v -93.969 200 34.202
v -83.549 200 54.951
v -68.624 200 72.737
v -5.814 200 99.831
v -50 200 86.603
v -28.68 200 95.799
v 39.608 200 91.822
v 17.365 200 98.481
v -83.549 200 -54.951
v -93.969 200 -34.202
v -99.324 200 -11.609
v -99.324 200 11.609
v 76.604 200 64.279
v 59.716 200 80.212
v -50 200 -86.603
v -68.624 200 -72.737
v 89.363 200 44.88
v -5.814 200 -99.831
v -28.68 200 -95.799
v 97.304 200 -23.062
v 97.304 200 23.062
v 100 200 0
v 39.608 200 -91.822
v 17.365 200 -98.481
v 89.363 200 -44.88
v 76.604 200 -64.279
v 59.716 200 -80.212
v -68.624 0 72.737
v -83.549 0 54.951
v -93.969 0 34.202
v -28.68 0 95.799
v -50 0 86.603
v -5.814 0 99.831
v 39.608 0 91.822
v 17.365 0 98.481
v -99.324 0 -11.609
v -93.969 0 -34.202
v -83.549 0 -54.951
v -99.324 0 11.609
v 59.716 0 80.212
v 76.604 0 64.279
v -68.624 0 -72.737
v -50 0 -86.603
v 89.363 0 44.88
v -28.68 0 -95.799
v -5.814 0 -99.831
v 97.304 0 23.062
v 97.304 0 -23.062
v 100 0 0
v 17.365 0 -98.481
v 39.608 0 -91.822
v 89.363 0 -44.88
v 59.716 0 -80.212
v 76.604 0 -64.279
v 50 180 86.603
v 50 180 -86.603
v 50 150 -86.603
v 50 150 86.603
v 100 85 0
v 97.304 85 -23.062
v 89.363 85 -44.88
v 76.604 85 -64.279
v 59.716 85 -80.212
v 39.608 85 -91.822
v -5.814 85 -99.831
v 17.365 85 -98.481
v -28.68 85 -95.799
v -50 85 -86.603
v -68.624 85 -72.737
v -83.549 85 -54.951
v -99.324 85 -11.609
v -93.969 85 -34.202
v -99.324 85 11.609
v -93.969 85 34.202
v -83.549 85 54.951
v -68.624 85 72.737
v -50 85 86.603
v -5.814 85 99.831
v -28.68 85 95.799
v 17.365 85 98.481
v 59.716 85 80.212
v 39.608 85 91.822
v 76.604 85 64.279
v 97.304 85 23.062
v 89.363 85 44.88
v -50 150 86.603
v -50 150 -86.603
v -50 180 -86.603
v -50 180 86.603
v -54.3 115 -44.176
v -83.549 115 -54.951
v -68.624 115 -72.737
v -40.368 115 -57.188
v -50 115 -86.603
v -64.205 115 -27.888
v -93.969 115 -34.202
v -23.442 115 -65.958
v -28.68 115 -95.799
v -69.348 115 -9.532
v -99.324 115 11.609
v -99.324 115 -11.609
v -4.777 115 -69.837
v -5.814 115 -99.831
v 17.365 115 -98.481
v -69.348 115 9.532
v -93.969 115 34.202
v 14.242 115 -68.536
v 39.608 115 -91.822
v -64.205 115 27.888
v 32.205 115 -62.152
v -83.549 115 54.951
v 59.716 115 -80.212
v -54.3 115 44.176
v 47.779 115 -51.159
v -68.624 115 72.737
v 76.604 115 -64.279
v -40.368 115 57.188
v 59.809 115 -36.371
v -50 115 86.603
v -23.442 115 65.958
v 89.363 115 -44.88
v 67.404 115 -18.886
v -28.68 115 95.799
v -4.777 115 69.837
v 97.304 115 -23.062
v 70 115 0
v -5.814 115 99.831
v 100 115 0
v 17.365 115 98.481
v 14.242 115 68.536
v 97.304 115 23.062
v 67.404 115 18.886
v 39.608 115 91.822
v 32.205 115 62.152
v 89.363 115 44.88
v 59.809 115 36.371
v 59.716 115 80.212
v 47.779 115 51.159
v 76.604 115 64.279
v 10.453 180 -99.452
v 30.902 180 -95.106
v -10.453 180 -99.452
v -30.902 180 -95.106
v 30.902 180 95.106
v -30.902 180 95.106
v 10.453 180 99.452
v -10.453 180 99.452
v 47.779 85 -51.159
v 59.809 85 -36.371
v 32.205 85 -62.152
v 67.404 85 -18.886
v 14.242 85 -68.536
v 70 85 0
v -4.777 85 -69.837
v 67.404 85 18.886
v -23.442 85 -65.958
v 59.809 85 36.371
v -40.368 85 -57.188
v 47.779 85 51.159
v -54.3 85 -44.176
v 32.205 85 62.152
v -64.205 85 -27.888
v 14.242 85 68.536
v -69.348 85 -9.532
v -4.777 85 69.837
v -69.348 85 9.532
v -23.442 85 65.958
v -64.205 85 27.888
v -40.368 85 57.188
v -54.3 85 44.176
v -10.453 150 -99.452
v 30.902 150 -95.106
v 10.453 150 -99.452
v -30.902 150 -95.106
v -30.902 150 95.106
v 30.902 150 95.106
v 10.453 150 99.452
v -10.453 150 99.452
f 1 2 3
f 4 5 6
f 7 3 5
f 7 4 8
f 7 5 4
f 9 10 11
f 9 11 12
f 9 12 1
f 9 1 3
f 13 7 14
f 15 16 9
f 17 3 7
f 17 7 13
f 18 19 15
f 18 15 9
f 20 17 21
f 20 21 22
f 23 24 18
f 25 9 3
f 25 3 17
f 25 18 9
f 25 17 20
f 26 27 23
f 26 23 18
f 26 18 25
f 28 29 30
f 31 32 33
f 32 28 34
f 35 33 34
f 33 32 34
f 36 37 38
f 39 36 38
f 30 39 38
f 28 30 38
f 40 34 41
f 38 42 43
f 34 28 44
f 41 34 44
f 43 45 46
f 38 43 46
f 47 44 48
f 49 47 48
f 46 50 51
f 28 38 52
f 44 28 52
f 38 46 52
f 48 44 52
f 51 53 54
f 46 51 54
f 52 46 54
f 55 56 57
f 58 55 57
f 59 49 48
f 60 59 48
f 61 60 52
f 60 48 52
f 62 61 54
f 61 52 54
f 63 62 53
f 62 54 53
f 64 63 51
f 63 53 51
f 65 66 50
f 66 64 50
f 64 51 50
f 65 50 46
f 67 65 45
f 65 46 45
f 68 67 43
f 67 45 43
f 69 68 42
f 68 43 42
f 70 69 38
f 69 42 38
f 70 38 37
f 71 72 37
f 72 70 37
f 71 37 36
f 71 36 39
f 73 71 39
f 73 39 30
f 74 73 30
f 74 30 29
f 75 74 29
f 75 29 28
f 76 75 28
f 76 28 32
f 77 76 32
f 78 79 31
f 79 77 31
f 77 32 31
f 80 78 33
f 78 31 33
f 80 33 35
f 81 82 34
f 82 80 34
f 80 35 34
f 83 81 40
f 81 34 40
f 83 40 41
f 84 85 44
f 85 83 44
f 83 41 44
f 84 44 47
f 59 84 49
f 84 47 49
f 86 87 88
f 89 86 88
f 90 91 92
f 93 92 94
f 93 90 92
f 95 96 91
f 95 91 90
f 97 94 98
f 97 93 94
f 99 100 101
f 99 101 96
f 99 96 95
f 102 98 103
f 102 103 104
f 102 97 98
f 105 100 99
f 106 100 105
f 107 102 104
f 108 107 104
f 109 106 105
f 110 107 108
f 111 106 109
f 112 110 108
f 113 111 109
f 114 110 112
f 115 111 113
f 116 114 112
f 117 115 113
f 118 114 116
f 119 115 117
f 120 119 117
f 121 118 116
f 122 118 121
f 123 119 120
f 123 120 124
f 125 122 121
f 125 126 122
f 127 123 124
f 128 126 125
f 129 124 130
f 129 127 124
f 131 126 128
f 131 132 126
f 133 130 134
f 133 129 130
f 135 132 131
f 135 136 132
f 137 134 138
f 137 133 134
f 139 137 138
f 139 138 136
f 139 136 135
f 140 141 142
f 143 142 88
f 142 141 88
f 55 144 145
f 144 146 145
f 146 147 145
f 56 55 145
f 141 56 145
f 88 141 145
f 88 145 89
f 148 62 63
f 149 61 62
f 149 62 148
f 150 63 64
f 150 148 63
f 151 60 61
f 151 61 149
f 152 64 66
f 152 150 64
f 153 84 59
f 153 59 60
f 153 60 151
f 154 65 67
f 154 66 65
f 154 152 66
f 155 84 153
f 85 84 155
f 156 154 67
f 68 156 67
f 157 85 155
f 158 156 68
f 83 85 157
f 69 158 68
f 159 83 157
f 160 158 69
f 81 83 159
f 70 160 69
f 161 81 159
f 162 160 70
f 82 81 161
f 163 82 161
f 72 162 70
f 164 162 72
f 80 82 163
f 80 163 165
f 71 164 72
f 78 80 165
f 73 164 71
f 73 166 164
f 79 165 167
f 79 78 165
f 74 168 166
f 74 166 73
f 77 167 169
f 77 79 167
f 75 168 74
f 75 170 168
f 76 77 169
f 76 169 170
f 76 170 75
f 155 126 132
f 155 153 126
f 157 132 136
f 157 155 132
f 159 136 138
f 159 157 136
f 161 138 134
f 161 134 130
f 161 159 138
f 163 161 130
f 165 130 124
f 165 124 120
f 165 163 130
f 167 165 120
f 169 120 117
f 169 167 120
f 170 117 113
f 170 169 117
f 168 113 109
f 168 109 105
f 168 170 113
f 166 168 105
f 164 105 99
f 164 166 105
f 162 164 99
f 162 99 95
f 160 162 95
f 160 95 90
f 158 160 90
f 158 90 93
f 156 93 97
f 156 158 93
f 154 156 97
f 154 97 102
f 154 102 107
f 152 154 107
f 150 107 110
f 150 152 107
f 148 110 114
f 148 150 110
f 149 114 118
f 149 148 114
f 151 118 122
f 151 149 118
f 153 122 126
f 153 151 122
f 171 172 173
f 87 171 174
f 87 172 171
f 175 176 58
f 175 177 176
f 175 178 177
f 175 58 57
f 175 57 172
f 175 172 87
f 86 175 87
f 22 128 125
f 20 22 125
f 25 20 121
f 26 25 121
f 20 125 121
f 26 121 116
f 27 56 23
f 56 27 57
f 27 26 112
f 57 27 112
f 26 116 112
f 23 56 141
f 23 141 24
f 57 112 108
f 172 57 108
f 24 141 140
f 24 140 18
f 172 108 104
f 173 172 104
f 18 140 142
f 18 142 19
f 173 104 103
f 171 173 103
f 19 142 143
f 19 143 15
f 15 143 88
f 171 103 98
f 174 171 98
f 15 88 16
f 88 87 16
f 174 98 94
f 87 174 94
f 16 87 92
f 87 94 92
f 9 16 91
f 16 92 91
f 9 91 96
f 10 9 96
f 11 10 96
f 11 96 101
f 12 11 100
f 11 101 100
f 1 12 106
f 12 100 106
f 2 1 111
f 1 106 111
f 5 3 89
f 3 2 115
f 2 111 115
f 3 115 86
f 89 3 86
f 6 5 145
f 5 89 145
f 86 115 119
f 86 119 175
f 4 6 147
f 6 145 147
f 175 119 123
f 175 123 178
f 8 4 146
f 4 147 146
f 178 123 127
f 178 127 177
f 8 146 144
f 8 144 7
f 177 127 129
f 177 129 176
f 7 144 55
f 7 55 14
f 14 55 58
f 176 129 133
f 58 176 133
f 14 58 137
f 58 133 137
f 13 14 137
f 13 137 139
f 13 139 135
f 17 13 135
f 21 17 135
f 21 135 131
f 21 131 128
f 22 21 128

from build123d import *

# Parameters (mm, degrees)
SKETCH2_R               = 100
BOSS_EXTRUDE1_DEPTH     = 200
CUT_EXTRUDE1_DEPTH      = 200
CUT_EXTRUDE1_DEPTH_BACK = 200


with BuildPart() as part:
    # Sketch2 → Boss-Extrude1 (new body)
    with BuildSketch(Plane(origin=(0, 0, 0), x_dir=(1, 0, 0), z_dir=(0, 1, 0))):
        Circle(SKETCH2_R)
    extrude(amount=BOSS_EXTRUDE1_DEPTH)

    # Sketch3 → Cut-Revolve3 (revolve, cut)
    with BuildSketch(Plane.XY):
        Polygon((100, 85), (100, 100), (100, 115), (70, 115), (70, 85), align=None)
    revolve(axis=Axis((0, 235.170477907, 0), (0, -1, 0)), mode=Mode.SUBTRACT)

    # Sketch4 → Cut-Extrude1 (cut, two sides: drawn at the far end of the back side and taken through both)
    with BuildSketch(Plane.XY.offset(-CUT_EXTRUDE1_DEPTH_BACK)):
        Polygon((0, 180), (50, 180), (50, 150), (-50, 150), (-50, 180), align=None)
    extrude(amount=CUT_EXTRUDE1_DEPTH + CUT_EXTRUDE1_DEPTH_BACK, mode=Mode.SUBTRACT)


solid = part.part
